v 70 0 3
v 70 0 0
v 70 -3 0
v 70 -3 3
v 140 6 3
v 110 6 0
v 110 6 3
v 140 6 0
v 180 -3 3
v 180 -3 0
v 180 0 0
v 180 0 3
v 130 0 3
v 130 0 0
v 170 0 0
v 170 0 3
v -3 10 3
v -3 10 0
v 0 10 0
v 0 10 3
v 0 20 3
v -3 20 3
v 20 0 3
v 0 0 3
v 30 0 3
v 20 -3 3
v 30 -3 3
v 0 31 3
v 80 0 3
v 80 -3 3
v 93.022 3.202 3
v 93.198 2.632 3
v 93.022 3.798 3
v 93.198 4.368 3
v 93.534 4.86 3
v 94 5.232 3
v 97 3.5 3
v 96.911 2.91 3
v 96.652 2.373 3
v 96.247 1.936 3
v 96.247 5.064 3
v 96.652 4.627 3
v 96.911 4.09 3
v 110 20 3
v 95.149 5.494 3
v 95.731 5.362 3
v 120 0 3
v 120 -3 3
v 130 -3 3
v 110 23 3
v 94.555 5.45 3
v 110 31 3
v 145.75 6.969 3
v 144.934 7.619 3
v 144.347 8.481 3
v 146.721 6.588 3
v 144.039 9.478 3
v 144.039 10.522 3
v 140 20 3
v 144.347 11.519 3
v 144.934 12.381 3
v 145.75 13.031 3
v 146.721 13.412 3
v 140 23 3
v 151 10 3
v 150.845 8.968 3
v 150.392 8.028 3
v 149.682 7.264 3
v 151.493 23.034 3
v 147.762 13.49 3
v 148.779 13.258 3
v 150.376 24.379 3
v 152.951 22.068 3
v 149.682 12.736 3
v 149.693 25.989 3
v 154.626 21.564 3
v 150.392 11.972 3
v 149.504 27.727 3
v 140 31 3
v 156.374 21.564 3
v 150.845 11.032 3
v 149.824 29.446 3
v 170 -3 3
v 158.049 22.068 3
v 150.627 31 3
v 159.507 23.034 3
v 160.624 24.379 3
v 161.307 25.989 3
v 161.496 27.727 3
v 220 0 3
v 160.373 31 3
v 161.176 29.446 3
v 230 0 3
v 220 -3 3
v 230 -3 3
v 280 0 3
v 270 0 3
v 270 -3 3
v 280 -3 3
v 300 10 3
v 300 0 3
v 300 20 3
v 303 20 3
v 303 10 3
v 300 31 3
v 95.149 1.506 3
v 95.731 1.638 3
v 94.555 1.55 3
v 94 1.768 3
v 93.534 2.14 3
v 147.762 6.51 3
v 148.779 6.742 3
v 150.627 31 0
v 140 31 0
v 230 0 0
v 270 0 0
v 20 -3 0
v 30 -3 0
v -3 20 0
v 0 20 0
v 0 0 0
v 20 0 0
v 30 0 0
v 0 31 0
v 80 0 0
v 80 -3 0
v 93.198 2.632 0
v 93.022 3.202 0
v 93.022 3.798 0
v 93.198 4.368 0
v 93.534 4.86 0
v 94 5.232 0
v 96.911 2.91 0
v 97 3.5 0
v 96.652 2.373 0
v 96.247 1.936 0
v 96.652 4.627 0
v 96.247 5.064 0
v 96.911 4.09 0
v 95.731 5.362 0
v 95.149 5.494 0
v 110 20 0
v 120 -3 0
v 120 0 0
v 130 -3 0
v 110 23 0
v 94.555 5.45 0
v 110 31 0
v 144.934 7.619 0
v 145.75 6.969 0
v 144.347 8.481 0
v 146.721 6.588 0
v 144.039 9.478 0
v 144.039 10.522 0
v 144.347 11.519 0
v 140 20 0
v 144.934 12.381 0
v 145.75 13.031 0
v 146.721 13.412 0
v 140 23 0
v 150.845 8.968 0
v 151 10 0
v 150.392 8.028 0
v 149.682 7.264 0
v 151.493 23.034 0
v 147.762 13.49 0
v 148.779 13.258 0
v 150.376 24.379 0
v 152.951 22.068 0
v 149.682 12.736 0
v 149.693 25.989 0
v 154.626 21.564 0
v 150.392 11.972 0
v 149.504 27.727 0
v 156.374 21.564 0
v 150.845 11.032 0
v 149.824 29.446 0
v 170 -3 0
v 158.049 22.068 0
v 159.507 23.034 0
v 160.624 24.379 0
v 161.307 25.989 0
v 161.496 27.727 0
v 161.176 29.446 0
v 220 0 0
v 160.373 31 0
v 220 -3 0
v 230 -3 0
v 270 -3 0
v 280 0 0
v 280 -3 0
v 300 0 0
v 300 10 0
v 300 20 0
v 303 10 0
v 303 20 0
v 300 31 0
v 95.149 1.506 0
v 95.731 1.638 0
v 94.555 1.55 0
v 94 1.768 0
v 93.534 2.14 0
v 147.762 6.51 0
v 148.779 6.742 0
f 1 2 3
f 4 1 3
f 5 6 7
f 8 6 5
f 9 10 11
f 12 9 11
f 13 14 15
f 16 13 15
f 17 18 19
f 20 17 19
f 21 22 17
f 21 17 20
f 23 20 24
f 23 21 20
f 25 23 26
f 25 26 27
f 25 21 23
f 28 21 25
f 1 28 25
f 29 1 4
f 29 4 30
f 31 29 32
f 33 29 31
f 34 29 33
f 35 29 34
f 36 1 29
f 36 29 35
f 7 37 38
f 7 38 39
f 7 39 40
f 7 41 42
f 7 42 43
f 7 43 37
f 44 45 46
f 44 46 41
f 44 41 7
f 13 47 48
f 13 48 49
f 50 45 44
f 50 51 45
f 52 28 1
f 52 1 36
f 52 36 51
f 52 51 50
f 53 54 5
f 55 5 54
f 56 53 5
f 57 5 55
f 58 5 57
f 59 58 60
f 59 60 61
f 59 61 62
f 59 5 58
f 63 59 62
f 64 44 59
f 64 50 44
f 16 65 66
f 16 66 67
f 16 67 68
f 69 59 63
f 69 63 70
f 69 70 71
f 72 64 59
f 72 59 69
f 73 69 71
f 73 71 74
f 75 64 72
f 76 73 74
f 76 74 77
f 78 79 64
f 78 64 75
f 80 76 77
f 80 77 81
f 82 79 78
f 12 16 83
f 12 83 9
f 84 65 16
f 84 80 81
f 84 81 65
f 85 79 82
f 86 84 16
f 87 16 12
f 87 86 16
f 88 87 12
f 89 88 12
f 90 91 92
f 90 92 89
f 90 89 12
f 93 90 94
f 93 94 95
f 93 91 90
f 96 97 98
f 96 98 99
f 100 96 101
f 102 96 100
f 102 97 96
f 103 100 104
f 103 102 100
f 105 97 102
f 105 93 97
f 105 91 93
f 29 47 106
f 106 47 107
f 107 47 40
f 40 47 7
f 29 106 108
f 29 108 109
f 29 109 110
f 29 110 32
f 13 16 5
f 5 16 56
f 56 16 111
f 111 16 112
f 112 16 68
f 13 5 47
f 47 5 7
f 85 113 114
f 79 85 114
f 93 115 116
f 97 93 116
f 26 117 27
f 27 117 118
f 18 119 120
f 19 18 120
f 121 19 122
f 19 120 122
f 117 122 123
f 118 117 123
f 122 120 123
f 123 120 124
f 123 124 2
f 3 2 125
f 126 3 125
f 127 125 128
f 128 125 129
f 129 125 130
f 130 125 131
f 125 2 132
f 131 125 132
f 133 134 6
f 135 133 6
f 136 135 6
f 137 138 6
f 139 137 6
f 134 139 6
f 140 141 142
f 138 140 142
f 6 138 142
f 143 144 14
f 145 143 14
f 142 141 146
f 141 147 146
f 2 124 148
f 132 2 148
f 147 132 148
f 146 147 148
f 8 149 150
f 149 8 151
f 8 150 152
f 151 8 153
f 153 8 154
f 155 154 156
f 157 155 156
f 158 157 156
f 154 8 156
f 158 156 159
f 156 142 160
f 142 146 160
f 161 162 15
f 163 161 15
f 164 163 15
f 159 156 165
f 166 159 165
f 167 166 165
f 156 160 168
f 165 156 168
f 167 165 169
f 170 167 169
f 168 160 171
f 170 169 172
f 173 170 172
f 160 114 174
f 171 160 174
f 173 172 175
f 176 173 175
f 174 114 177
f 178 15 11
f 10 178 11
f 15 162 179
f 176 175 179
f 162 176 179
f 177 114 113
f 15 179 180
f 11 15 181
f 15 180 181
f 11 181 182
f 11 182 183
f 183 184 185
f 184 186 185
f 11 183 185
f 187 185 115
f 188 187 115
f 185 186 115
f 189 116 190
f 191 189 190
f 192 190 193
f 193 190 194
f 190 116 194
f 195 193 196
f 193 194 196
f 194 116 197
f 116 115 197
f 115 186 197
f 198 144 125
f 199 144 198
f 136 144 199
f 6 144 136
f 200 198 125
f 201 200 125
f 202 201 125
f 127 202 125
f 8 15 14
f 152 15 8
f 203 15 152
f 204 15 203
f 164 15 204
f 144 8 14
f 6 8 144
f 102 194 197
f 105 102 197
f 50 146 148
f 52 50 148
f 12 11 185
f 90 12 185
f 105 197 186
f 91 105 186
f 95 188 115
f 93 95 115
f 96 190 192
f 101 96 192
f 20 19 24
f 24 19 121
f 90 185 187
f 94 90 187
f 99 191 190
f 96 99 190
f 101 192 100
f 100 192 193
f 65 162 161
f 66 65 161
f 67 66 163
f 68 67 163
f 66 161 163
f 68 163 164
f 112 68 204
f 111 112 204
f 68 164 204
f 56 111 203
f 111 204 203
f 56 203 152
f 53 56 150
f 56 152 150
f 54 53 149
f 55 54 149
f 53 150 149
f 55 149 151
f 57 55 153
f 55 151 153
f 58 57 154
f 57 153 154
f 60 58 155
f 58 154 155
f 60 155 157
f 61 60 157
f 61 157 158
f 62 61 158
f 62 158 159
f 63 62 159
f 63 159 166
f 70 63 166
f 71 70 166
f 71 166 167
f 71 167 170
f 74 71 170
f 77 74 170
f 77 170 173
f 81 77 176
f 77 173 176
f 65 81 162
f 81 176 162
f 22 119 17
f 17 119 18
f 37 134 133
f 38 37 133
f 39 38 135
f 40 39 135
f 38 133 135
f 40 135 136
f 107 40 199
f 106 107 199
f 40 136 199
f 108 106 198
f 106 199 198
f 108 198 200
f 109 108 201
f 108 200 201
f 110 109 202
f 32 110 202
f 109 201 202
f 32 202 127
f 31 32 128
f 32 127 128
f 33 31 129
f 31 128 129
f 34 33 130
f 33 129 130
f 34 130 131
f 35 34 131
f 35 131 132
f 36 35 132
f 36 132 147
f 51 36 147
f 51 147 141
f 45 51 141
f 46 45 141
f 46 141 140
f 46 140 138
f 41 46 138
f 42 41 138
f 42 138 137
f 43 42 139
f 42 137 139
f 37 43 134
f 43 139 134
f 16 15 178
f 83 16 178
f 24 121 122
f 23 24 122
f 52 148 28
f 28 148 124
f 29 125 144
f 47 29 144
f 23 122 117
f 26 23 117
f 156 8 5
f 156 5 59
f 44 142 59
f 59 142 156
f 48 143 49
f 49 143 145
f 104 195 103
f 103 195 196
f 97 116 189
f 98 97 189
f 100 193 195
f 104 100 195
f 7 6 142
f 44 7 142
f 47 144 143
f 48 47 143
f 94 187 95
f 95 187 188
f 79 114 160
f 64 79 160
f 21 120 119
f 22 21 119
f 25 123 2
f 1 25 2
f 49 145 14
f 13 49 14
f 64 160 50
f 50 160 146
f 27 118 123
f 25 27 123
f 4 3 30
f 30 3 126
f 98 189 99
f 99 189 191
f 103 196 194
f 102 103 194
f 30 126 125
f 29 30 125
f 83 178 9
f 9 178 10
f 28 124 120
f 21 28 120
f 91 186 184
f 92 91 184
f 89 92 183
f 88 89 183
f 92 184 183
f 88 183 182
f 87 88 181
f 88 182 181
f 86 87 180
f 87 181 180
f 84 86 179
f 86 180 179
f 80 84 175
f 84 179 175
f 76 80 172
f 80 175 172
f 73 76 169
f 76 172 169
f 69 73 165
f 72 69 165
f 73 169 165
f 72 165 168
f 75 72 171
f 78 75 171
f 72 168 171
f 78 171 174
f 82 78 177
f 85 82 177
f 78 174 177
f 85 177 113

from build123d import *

# Parameters (mm, degrees)
IMPORTED_BODY_4_1_OUTLINE_W = 30
IMPORTED_BODY_4_1_OUTLINE_H = 14
IMPORTED_BODY_4_1_DEPTH     = 3
SKETCH_1_R                  = 3.5
SKETCH_1_R_2                = 2
SKETCH_1_R_3                = 6
CUT_EXTRUDE_1_DEPTH         = 3


# Read off the part's stored shape, not the designer's step: 基体零件-零件4-1
with BuildPart() as part:
    # 基体零件-零件4-1 outline → 基体零件-零件4-1 (new body)
    with BuildSketch(Plane.XY):
        Polygon((110, 31), (0, 31), (0, 20), (-3, 20), (-3, 10), (0, 10), (0, 0), (20, 0), (20, -3), (30, -3), (30, 0), (70, 0), (70, -3), (80, -3), (80, 0), (120, 0), (120, -3), (130, -3), (130, 0), (170, 0), (170, -3), (180, -3), (180, 0), (220, 0), (220, -3), (230, -3), (230, 0), (270, 0), (270, -3), (280, -3), (280, 0), (300, 0), (300, 10), (303, 10), (303, 20), (300, 20), (300, 31), (140, 31), (140, 23), (110, 23), align=None)
        with Locations((125, 13)):
            Rectangle(IMPORTED_BODY_4_1_OUTLINE_W, IMPORTED_BODY_4_1_OUTLINE_H, mode=Mode.SUBTRACT)
    extrude(amount=IMPORTED_BODY_4_1_DEPTH)

    # 草图1 → 切除-拉伸1 (cut)
    with BuildSketch(Plane(origin=(0, 0, 0), x_dir=(-1, 0, 0), z_dir=(0, 0, -1))):
        with Locations(Location((-147.5, 10, 0), (0, 0, 180))):
            Circle(SKETCH_1_R)
        with Locations(Location((-95, 3.5, 0), (0, 0, 180))):
            Circle(SKETCH_1_R_2)
        with Locations((-155.5, 27.5)):
            Circle(SKETCH_1_R_3)
    extrude(amount=-CUT_EXTRUDE_1_DEPTH, mode=Mode.SUBTRACT)


solid = part.part
